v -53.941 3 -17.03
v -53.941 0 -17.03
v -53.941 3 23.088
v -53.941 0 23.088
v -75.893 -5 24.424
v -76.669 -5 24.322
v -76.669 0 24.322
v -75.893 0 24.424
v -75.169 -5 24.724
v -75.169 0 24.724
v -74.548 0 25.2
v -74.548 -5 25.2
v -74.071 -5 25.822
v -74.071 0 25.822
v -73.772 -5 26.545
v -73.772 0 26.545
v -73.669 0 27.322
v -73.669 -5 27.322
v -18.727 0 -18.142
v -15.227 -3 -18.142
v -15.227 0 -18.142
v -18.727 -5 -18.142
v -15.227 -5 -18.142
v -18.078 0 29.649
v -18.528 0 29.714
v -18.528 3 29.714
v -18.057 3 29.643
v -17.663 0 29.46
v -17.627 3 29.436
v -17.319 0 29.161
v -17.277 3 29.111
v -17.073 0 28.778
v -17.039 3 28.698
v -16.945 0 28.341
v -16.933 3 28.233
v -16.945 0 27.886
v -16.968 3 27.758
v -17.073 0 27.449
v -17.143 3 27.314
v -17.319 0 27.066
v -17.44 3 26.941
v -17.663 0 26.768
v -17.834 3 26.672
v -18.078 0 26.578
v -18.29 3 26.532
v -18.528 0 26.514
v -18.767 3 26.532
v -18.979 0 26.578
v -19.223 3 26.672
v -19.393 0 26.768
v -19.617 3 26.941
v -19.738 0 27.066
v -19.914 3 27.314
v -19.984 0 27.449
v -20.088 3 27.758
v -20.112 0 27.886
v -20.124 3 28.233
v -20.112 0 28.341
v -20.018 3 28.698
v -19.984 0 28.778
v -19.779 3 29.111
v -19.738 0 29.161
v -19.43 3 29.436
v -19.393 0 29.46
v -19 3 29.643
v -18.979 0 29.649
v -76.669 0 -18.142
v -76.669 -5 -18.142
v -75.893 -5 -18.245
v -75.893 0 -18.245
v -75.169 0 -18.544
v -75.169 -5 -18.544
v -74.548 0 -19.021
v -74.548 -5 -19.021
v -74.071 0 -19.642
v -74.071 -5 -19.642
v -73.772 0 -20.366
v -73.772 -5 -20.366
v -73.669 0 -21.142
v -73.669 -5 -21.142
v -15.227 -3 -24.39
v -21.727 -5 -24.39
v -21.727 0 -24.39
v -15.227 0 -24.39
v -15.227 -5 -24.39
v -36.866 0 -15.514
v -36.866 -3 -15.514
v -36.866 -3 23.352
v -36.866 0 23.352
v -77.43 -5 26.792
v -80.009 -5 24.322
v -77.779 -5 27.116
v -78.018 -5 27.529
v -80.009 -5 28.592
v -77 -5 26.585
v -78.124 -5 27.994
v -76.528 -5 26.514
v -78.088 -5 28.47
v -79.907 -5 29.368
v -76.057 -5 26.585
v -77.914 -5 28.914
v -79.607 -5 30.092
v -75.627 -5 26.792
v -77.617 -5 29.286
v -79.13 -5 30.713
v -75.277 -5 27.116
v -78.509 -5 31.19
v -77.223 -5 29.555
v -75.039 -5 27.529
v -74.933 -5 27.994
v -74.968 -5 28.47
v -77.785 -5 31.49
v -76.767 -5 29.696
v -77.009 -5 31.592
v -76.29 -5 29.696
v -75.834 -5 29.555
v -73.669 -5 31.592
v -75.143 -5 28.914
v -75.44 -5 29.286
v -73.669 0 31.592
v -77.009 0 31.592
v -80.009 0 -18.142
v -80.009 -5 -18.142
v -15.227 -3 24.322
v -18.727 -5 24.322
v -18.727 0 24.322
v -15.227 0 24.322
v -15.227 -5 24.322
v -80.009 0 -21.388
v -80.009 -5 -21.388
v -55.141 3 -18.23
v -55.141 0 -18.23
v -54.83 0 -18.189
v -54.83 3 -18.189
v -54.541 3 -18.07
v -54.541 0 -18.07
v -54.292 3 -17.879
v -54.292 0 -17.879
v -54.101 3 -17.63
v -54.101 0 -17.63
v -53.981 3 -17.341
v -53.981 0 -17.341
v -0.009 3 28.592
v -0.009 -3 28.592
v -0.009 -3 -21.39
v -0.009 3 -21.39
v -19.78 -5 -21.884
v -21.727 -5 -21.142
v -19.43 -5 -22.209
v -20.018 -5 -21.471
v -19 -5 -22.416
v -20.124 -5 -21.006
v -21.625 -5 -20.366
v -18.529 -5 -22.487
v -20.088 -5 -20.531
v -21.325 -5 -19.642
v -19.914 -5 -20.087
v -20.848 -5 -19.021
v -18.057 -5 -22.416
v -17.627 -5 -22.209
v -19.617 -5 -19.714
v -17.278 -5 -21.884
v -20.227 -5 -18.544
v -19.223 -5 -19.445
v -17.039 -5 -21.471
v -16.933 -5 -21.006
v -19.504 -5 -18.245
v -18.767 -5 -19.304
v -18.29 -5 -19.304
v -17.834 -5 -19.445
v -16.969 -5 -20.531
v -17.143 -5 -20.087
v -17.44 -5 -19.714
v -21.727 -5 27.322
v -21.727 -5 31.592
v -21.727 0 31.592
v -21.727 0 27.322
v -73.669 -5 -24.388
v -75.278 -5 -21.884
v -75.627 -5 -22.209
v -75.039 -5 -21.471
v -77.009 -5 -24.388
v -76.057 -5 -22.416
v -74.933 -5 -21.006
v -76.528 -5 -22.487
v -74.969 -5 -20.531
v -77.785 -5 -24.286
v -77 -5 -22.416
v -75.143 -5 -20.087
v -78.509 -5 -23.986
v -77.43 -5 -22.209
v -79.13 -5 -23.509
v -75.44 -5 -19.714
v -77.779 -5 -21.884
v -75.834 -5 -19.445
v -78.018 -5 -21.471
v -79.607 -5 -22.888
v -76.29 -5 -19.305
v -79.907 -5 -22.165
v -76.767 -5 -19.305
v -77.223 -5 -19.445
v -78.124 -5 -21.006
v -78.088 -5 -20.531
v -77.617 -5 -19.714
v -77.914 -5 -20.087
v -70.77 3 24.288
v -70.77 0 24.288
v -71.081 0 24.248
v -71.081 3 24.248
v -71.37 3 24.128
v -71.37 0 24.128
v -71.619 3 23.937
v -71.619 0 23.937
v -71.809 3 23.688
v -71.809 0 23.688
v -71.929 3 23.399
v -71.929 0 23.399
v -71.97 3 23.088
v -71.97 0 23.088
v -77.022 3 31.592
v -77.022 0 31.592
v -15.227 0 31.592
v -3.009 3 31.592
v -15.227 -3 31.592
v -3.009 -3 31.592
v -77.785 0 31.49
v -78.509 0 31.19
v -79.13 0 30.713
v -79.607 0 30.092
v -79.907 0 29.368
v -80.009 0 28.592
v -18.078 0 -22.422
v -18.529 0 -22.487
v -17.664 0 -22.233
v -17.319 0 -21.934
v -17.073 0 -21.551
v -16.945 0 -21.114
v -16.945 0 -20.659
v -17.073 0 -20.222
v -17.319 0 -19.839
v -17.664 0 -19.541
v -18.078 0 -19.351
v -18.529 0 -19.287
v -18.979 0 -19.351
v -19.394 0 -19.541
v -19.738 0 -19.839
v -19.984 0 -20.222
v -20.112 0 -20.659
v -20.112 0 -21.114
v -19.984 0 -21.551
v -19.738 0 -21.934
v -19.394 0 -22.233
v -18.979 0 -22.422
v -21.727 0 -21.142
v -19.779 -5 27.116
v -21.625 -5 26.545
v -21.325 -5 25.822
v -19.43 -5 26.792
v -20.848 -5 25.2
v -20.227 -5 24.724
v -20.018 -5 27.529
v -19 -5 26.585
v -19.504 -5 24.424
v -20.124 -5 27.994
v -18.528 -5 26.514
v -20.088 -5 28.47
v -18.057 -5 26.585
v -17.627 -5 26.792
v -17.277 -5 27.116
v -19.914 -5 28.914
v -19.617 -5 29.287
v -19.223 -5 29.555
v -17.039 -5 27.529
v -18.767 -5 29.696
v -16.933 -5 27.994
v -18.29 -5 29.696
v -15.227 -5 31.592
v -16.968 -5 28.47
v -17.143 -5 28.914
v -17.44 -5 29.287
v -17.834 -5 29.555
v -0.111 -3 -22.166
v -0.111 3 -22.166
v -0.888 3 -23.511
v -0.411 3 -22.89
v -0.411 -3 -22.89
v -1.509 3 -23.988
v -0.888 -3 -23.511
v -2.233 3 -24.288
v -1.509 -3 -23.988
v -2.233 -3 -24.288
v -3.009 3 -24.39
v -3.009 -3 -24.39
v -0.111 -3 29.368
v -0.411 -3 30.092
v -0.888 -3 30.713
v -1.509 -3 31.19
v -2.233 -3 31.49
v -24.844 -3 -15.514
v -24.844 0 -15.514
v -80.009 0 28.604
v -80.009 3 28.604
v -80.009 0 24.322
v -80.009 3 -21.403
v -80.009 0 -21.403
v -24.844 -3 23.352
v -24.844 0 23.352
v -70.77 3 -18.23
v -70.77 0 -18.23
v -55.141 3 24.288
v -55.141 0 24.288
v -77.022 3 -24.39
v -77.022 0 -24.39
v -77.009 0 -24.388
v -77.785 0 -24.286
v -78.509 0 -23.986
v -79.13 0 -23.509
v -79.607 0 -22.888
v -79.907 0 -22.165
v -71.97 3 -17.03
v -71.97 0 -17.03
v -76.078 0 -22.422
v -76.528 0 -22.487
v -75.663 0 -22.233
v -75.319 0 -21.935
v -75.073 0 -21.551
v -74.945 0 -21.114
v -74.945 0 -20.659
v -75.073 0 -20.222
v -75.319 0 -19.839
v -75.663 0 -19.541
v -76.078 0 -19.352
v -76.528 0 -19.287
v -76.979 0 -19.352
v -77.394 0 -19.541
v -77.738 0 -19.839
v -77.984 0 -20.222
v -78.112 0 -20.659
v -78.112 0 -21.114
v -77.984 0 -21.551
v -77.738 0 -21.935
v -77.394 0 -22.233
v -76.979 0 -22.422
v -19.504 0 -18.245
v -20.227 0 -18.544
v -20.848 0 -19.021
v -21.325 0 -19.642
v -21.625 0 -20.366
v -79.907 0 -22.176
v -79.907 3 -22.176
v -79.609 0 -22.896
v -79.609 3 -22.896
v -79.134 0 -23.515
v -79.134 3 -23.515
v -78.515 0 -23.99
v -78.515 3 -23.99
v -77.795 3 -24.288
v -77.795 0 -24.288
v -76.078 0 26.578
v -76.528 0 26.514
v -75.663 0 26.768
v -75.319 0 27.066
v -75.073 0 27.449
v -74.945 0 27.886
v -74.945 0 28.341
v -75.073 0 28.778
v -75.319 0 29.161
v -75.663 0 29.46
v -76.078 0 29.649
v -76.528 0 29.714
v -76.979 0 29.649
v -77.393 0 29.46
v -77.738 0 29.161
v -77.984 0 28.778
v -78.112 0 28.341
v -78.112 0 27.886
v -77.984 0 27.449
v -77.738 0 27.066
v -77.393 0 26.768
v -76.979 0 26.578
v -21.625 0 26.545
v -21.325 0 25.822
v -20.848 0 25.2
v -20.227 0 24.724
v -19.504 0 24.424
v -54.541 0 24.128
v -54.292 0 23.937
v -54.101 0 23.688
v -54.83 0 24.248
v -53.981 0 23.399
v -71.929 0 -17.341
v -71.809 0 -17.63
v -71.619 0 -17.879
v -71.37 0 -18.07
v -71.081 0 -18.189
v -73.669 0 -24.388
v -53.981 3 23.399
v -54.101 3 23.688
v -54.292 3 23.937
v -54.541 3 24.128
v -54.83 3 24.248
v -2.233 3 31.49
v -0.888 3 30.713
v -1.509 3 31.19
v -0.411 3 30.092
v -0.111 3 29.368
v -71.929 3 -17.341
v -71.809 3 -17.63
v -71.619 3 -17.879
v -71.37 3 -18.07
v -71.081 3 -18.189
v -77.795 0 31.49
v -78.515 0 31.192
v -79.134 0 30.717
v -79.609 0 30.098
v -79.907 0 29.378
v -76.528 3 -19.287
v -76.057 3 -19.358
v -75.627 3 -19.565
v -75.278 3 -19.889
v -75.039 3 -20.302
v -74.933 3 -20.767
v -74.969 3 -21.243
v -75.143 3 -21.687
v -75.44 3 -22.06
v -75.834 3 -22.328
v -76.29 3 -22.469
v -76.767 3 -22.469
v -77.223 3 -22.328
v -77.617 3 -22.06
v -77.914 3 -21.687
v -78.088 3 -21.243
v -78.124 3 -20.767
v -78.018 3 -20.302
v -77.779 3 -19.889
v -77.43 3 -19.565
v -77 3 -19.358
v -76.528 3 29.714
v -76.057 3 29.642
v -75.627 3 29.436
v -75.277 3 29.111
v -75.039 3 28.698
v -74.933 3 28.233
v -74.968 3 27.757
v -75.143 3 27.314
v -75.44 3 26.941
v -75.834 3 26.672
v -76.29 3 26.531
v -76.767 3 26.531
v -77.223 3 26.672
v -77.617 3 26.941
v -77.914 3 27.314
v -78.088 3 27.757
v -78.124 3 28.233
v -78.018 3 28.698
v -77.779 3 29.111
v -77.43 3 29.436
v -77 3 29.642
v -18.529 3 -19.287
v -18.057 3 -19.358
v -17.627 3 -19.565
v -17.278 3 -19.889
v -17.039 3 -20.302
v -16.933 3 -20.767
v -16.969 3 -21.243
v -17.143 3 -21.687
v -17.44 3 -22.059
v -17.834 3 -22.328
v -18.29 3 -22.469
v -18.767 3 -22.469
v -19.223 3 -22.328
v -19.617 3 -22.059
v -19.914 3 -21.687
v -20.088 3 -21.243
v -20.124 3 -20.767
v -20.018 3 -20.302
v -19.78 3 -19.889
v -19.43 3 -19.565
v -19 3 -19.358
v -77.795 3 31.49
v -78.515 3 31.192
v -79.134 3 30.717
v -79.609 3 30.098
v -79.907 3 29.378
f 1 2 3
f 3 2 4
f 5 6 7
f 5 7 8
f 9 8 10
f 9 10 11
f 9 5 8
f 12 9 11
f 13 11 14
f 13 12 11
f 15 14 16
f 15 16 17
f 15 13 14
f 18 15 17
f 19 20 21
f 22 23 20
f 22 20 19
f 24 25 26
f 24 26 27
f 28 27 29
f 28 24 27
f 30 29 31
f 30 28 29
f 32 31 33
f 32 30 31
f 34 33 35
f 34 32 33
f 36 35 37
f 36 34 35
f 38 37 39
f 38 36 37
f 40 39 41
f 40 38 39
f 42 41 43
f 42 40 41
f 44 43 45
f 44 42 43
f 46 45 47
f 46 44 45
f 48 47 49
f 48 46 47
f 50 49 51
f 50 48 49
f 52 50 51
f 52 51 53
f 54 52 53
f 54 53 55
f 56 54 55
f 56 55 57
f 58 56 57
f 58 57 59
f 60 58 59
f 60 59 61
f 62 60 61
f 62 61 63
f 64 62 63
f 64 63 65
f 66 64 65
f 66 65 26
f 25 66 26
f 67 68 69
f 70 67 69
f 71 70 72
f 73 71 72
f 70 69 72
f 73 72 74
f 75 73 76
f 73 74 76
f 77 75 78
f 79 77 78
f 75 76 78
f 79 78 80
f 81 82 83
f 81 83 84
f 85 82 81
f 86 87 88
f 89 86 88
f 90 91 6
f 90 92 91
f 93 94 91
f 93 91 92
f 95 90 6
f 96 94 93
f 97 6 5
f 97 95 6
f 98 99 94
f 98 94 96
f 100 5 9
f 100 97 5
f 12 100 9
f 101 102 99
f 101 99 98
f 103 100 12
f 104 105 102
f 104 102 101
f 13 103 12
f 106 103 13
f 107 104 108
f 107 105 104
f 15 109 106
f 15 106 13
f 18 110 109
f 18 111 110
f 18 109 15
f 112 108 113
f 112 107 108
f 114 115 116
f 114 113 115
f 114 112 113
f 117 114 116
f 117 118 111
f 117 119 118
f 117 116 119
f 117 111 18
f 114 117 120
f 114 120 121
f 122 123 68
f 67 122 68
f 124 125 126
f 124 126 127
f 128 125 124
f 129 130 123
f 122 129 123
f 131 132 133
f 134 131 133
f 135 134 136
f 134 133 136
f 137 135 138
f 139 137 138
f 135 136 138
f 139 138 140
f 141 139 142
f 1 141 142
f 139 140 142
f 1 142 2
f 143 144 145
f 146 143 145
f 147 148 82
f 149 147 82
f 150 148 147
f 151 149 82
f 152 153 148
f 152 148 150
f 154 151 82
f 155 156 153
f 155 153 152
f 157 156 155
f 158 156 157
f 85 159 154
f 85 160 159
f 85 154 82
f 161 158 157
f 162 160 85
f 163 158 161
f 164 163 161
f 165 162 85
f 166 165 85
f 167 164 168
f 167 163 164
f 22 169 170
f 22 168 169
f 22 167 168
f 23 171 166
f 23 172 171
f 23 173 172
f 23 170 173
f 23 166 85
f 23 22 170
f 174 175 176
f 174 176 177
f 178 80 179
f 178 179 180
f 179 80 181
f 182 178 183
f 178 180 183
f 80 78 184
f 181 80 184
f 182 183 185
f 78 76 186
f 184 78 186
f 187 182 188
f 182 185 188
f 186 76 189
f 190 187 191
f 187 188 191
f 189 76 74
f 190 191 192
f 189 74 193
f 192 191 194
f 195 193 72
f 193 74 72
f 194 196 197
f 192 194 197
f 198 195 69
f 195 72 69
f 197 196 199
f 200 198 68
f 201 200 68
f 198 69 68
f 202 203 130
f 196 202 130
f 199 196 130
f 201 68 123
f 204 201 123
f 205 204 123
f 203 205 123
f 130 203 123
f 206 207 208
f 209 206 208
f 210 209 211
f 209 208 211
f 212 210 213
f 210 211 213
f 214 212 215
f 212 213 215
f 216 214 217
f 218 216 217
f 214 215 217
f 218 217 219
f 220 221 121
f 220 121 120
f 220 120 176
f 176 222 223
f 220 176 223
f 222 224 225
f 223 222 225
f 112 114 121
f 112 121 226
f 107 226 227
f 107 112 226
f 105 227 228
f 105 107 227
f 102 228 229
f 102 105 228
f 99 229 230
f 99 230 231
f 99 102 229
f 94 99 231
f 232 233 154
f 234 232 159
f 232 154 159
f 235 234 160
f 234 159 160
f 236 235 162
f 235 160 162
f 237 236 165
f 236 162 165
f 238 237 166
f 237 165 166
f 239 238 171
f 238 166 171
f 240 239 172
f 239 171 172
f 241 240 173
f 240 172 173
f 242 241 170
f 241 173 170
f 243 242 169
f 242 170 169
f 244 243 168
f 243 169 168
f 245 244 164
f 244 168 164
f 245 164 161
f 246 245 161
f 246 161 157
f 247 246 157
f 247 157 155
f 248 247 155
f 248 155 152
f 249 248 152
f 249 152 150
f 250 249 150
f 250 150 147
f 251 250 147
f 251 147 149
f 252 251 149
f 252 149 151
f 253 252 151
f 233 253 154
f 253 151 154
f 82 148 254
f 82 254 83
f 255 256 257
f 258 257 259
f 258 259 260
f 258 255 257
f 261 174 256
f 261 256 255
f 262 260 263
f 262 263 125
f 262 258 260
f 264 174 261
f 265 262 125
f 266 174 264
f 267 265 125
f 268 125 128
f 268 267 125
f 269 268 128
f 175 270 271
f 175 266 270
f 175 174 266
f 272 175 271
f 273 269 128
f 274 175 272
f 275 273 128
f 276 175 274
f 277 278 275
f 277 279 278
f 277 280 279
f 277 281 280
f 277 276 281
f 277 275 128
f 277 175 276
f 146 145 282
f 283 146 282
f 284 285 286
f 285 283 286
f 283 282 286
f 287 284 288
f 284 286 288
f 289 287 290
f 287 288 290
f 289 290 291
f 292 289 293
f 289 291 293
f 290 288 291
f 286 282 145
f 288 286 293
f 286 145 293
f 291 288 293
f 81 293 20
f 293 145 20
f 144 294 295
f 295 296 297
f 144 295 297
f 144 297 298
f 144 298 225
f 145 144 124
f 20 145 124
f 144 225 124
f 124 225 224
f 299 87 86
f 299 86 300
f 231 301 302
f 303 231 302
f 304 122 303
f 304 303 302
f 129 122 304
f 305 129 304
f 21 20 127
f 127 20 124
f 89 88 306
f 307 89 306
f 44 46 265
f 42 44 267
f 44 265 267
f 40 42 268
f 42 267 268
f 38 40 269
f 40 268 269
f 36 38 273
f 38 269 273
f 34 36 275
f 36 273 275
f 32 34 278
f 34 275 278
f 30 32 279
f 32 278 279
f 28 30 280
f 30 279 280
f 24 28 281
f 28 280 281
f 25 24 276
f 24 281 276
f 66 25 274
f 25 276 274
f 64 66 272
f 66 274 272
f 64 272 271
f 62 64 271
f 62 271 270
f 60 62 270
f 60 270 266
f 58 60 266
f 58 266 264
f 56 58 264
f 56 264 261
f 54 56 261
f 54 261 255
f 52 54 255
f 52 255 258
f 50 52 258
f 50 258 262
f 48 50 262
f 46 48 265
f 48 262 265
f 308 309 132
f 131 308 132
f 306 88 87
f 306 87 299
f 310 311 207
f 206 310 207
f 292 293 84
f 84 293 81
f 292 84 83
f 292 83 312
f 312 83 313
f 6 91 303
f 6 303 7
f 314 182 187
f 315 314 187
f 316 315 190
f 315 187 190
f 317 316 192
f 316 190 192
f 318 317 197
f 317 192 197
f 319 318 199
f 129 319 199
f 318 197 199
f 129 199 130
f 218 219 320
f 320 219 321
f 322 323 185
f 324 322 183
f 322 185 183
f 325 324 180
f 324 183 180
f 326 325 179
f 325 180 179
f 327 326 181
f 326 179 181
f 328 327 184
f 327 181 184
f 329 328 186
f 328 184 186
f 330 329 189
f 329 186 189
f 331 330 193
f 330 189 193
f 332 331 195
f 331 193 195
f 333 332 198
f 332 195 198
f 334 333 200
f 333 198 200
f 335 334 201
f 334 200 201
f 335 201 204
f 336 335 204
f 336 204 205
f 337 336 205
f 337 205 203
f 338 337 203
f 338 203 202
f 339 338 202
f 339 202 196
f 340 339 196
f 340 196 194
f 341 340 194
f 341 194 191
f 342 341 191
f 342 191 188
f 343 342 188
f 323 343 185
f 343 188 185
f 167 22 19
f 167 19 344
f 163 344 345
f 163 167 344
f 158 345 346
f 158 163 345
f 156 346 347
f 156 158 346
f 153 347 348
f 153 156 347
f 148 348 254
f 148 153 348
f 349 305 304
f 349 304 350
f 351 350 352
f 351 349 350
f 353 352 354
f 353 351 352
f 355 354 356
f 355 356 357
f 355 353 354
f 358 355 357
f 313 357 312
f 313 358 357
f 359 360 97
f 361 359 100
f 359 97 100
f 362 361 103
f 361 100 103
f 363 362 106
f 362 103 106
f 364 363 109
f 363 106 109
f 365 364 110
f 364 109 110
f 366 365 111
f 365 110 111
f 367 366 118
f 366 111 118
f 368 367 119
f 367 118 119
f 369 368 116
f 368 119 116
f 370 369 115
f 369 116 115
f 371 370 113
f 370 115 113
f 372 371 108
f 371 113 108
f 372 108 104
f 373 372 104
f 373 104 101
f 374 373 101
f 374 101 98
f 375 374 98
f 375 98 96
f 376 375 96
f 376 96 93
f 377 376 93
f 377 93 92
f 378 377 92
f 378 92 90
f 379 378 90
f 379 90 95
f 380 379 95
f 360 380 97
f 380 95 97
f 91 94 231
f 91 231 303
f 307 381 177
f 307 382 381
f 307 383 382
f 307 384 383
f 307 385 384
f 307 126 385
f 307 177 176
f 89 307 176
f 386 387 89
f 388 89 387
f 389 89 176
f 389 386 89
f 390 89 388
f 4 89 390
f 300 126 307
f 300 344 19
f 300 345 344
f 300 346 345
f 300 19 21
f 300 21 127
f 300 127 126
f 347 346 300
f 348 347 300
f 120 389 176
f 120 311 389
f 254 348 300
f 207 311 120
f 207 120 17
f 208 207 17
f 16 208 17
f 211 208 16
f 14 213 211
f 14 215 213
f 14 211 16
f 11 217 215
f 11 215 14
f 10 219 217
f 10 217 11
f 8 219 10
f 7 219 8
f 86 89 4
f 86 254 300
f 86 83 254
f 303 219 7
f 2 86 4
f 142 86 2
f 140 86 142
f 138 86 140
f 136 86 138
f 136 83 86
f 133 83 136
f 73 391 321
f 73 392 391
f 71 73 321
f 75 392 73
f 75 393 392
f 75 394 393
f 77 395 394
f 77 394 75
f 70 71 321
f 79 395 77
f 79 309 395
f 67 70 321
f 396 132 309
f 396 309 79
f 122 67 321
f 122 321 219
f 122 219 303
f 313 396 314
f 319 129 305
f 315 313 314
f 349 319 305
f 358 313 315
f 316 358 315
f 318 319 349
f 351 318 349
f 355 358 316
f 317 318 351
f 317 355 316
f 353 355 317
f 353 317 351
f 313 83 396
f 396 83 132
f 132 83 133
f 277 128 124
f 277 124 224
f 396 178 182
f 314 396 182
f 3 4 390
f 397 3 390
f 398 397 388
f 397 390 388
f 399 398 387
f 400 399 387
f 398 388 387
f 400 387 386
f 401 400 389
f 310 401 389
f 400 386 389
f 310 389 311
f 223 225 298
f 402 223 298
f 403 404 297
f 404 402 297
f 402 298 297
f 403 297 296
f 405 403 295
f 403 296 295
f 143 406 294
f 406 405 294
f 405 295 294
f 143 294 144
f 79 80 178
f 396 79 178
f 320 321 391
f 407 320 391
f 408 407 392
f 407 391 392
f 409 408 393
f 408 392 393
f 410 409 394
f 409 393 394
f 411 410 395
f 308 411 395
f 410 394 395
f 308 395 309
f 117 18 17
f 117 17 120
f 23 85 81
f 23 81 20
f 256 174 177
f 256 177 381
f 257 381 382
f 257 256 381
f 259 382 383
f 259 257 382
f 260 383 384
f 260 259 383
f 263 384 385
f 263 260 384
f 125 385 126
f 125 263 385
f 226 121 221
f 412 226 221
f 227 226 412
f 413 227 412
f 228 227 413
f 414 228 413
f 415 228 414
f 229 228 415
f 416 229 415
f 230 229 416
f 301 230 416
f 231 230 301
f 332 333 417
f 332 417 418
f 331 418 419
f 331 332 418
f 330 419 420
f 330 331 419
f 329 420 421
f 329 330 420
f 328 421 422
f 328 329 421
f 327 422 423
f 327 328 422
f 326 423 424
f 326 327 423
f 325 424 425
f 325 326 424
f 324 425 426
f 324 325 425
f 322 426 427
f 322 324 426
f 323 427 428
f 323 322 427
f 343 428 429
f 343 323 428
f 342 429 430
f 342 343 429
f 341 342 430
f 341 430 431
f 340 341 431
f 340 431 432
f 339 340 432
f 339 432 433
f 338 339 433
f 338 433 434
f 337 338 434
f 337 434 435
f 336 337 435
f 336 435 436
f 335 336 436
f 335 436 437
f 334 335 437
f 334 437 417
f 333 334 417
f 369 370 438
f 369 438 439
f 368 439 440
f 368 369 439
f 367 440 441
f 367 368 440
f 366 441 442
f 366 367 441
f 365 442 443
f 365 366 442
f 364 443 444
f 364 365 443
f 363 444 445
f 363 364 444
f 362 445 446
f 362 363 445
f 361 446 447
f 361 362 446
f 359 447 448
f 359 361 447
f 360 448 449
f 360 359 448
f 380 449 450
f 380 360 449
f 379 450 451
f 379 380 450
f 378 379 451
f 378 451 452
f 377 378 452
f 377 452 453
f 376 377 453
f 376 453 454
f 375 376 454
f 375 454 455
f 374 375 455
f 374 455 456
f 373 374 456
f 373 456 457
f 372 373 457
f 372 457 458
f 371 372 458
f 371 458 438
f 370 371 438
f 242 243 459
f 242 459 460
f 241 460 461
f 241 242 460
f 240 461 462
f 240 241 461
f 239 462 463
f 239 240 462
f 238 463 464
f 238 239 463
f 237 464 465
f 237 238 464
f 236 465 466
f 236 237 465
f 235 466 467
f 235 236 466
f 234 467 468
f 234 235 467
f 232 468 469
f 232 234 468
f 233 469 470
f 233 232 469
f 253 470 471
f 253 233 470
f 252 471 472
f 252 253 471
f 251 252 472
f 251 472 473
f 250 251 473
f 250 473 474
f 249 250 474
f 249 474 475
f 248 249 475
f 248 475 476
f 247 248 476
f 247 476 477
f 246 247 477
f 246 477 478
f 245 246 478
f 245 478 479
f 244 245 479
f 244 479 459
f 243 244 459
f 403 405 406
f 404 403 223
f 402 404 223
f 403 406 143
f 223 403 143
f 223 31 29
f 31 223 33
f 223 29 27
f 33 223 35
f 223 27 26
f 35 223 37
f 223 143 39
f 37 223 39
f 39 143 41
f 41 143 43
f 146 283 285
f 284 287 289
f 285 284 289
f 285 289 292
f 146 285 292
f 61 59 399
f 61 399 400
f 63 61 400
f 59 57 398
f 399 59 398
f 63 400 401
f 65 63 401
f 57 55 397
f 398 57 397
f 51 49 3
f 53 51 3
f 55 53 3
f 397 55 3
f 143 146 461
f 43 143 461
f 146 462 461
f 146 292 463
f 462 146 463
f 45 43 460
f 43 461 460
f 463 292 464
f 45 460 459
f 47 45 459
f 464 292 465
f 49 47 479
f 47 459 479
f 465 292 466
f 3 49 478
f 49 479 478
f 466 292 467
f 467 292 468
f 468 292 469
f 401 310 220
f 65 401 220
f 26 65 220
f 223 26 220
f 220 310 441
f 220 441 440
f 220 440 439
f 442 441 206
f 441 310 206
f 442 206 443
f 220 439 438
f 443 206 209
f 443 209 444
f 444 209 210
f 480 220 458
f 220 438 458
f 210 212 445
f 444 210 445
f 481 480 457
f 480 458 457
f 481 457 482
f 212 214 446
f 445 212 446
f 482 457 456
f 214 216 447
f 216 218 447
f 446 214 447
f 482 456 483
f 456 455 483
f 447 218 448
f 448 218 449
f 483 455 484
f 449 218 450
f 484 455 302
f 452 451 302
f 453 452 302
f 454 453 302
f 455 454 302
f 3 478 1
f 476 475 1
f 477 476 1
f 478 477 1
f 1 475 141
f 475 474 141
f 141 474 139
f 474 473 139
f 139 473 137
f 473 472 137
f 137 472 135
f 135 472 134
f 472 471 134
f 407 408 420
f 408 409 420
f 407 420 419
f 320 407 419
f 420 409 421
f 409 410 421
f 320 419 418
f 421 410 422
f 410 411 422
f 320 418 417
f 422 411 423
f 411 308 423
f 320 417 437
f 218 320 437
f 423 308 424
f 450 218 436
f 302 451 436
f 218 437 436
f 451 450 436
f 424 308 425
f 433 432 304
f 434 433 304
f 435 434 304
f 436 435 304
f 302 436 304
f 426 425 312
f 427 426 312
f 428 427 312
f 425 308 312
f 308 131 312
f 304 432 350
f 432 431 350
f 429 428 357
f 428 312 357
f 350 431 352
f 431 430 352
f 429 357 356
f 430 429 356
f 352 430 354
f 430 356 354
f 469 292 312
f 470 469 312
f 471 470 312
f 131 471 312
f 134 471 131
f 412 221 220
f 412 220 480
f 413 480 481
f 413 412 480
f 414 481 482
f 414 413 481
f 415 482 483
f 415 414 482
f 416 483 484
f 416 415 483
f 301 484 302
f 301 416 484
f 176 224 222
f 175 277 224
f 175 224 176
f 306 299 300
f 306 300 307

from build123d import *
from build123d.topology import SkipClean

# Parameters (mm, degrees)
SKETCH_1_R      = 1.6
EXTRUDE_1_DEPTH = 3
EXTRUDE_START   = 3
SKETCH_3_W      = 12.02170443
SKETCH_3_H      = 38.866282165
EXTRUDE_3_DEPTH = 3
EXTRUDE_START_2 = 5
SKETCH_4_R      = 1.6
EXTRUDE_4_DEPTH = 5


with BuildPart() as part:
    # 草图1 → 凸台-拉伸1 (new body)
    with BuildSketch(Plane(origin=(0, 0, 0), x_dir=(1, 0, 0), z_dir=(0, 1, 0))):
        with BuildLine():
            Line((-0.009028181, 21.389975432), (-0.009028181, -28.591736531))
            ThreePointArc((-0.009028181, -28.591736531), (-0.887707838, -30.713056875), (-3.009028181, -31.591736531))
            Line((-3.009028181, -31.591736531), (-77.021723127, -31.591736531))
            ThreePointArc((-77.021723127, -31.591736531), (-79.134066788, -30.716775138), (-80.009028181, -28.604431477))
            Line((-80.009028181, -28.604431477), (-80.009028181, 21.402670377))
            ThreePointArc((-80.009028181, 21.402670377), (-79.134066788, 23.515014039), (-77.021723127, 24.389975432))
            Line((-77.021723127, 24.389975432), (-3.009028181, 24.389975432))
            ThreePointArc((-3.009028181, 24.389975432), (-0.887707838, 23.511295776), (-0.009028181, 21.389975432))
        make_face()
        with Locations(Location((-76.52848462, 20.886724226, 0), (0, 0, 270))):
            Circle(SKETCH_1_R, mode=Mode.SUBTRACT)
        with Locations(Location((-18.52858622, 20.886597225, 0), (0, 0, 270))):
            Circle(SKETCH_1_R, mode=Mode.SUBTRACT)
        with Locations(Location((-18.52833222, -28.113656775, 0), (0, 0, 270))):
            Circle(SKETCH_1_R, mode=Mode.SUBTRACT)
        with Locations(Location((-76.52833222, -28.113529775, 0), (0, 0, 270))):
            Circle(SKETCH_1_R, mode=Mode.SUBTRACT)
        with BuildLine():
            Line((-70.770059731, 18.230282987), (-55.140568984, 18.230282987))
            ThreePointArc((-55.140568984, 18.230282987), (-54.292040846, 17.878811124), (-53.940568984, 17.030282987))
            Line((-53.940568984, 17.030282987), (-53.940568984, -23.088422311))
            ThreePointArc((-53.940568984, -23.088422311), (-54.292040846, -23.936950448), (-55.140568984, -24.288422311))
            Line((-55.140568984, -24.288422311), (-70.770059731, -24.288422311))
            ThreePointArc((-70.770059731, -24.288422311), (-71.618587868, -23.936950448), (-71.970059731, -23.088422311))
            Line((-71.970059731, -23.088422311), (-71.970059731, 17.030282987))
            ThreePointArc((-71.970059731, 17.030282987), (-71.618587868, 17.878811124), (-70.770059731, 18.230282987))
        make_face(mode=Mode.SUBTRACT)
    extrude(amount=EXTRUDE_1_DEPTH)

    # 草图3 → 凸台-拉伸3 (add)
    with BuildSketch(Plane.XZ.offset(EXTRUDE_START)):
        with BuildLine():
            Line((-15.227079657, 31.591736531), (-3.009028181, 31.591736531))
            ThreePointArc((-3.009028181, 31.591736531), (-0.887707838, 30.713056875), (-0.009028181, 28.591736531))
            Line((-0.009028181, 28.591736531), (-0.009028181, -21.389975432))
            ThreePointArc((-0.009028181, -21.389975432), (-0.887707838, -23.511295776), (-3.009028181, -24.389975432))
            Line((-3.009028181, -24.389975432), (-15.227079657, -24.389975432))
            Line((-15.227079657, -24.389975432), (-15.227079657, 31.591736531))
        make_face()
        with Locations((-30.854956036, 3.919082923)):
            Rectangle(SKETCH_3_W, SKETCH_3_H)
    extrude(amount=-EXTRUDE_3_DEPTH)

    # 草图4 → 凸台-拉伸4 (add)
    # profile 1 of 4: a face of its own
    with SkipClean():  # the faces are left unmerged after this step: merging them gives an invalid solid
        with BuildSketch(Plane.XZ.offset(EXTRUDE_START_2)):
            with BuildLine():
                Line((-80.009028181, 24.321697646), (-76.669469558, 24.321697646))
                ThreePointArc((-76.669469558, 24.321697646), (-74.548149215, 25.200377302), (-73.669469558, 27.321697646))
                Line((-73.669469558, 27.321697646), (-73.669469558, 31.591736531))
                Line((-73.669469558, 31.591736531), (-77.009028181, 31.591736531))
                ThreePointArc((-77.009028181, 31.591736531), (-79.130348525, 30.713056875), (-80.009028181, 28.591736531))
                Line((-80.009028181, 28.591736531), (-80.009028181, 24.321697646))
            make_face()
            with Locations(Location((-76.52833222, 28.113529775, 0), (0, 0, 270))):
                Circle(SKETCH_4_R, mode=Mode.SUBTRACT)
        # profile 2 of 4: a face of its own
        with BuildSketch(Plane.XZ.offset(EXTRUDE_START_2)):
            with BuildLine():
                Line((-15.227079657, 24.321697646), (-15.227079657, 31.591736531))
                Line((-15.227079657, 31.591736531), (-21.727079657, 31.591736531))
                Line((-21.727079657, 31.591736531), (-21.727079657, 27.321697646))
                ThreePointArc((-21.727079657, 27.321697646), (-20.848400001, 25.200377302), (-18.727079657, 24.321697646))
                Line((-18.727079657, 24.321697646), (-15.227079657, 24.321697646))
            make_face()
            with Locations(Location((-18.52833222, 28.113656775, 0), (0, 0, 270))):
                Circle(SKETCH_4_R, mode=Mode.SUBTRACT)
        # profile 3 of 4: a face of its own
        with BuildSketch(Plane.XZ.offset(EXTRUDE_START_2)):
            with BuildLine():
                Line((-21.727079657, -21.142340772), (-21.727079657, -24.389975432))
                Line((-21.727079657, -24.389975432), (-15.227079657, -24.389975432))
                Line((-15.227079657, -24.389975432), (-15.227079657, -18.142340772))
                Line((-15.227079657, -18.142340772), (-18.727079657, -18.142340772))
                ThreePointArc((-18.727079657, -18.142340772), (-20.848400001, -19.021020428), (-21.727079657, -21.142340772))
            make_face()
            with Locations(Location((-18.52858622, -20.886597225, 0), (0, 0, 270))):
                Circle(SKETCH_4_R, mode=Mode.SUBTRACT)
        # profile 4 of 4: a face of its own
        with BuildSketch(Plane.XZ.offset(EXTRUDE_START_2)):
            with BuildLine():
                Line((-80.009028181, -18.142340772), (-76.669469558, -18.142340772))
                ThreePointArc((-76.669469558, -18.142340772), (-74.548149215, -19.021020428), (-73.669469558, -21.142340772))
                Line((-73.669469558, -21.142340772), (-73.669469558, -24.388169156))
                Line((-73.669469558, -24.388169156), (-77.009028181, -24.388169156))
                ThreePointArc((-77.009028181, -24.388169156), (-79.130348525, -23.5094895), (-80.009028181, -21.388169156))
                Line((-80.009028181, -21.388169156), (-80.009028181, -18.142340772))
            make_face()
            with Locations(Location((-76.52848462, -20.886724226, 0), (0, 0, 270))):
                Circle(SKETCH_4_R, mode=Mode.SUBTRACT)
        extrude(amount=-EXTRUDE_4_DEPTH)


solid = part.part
